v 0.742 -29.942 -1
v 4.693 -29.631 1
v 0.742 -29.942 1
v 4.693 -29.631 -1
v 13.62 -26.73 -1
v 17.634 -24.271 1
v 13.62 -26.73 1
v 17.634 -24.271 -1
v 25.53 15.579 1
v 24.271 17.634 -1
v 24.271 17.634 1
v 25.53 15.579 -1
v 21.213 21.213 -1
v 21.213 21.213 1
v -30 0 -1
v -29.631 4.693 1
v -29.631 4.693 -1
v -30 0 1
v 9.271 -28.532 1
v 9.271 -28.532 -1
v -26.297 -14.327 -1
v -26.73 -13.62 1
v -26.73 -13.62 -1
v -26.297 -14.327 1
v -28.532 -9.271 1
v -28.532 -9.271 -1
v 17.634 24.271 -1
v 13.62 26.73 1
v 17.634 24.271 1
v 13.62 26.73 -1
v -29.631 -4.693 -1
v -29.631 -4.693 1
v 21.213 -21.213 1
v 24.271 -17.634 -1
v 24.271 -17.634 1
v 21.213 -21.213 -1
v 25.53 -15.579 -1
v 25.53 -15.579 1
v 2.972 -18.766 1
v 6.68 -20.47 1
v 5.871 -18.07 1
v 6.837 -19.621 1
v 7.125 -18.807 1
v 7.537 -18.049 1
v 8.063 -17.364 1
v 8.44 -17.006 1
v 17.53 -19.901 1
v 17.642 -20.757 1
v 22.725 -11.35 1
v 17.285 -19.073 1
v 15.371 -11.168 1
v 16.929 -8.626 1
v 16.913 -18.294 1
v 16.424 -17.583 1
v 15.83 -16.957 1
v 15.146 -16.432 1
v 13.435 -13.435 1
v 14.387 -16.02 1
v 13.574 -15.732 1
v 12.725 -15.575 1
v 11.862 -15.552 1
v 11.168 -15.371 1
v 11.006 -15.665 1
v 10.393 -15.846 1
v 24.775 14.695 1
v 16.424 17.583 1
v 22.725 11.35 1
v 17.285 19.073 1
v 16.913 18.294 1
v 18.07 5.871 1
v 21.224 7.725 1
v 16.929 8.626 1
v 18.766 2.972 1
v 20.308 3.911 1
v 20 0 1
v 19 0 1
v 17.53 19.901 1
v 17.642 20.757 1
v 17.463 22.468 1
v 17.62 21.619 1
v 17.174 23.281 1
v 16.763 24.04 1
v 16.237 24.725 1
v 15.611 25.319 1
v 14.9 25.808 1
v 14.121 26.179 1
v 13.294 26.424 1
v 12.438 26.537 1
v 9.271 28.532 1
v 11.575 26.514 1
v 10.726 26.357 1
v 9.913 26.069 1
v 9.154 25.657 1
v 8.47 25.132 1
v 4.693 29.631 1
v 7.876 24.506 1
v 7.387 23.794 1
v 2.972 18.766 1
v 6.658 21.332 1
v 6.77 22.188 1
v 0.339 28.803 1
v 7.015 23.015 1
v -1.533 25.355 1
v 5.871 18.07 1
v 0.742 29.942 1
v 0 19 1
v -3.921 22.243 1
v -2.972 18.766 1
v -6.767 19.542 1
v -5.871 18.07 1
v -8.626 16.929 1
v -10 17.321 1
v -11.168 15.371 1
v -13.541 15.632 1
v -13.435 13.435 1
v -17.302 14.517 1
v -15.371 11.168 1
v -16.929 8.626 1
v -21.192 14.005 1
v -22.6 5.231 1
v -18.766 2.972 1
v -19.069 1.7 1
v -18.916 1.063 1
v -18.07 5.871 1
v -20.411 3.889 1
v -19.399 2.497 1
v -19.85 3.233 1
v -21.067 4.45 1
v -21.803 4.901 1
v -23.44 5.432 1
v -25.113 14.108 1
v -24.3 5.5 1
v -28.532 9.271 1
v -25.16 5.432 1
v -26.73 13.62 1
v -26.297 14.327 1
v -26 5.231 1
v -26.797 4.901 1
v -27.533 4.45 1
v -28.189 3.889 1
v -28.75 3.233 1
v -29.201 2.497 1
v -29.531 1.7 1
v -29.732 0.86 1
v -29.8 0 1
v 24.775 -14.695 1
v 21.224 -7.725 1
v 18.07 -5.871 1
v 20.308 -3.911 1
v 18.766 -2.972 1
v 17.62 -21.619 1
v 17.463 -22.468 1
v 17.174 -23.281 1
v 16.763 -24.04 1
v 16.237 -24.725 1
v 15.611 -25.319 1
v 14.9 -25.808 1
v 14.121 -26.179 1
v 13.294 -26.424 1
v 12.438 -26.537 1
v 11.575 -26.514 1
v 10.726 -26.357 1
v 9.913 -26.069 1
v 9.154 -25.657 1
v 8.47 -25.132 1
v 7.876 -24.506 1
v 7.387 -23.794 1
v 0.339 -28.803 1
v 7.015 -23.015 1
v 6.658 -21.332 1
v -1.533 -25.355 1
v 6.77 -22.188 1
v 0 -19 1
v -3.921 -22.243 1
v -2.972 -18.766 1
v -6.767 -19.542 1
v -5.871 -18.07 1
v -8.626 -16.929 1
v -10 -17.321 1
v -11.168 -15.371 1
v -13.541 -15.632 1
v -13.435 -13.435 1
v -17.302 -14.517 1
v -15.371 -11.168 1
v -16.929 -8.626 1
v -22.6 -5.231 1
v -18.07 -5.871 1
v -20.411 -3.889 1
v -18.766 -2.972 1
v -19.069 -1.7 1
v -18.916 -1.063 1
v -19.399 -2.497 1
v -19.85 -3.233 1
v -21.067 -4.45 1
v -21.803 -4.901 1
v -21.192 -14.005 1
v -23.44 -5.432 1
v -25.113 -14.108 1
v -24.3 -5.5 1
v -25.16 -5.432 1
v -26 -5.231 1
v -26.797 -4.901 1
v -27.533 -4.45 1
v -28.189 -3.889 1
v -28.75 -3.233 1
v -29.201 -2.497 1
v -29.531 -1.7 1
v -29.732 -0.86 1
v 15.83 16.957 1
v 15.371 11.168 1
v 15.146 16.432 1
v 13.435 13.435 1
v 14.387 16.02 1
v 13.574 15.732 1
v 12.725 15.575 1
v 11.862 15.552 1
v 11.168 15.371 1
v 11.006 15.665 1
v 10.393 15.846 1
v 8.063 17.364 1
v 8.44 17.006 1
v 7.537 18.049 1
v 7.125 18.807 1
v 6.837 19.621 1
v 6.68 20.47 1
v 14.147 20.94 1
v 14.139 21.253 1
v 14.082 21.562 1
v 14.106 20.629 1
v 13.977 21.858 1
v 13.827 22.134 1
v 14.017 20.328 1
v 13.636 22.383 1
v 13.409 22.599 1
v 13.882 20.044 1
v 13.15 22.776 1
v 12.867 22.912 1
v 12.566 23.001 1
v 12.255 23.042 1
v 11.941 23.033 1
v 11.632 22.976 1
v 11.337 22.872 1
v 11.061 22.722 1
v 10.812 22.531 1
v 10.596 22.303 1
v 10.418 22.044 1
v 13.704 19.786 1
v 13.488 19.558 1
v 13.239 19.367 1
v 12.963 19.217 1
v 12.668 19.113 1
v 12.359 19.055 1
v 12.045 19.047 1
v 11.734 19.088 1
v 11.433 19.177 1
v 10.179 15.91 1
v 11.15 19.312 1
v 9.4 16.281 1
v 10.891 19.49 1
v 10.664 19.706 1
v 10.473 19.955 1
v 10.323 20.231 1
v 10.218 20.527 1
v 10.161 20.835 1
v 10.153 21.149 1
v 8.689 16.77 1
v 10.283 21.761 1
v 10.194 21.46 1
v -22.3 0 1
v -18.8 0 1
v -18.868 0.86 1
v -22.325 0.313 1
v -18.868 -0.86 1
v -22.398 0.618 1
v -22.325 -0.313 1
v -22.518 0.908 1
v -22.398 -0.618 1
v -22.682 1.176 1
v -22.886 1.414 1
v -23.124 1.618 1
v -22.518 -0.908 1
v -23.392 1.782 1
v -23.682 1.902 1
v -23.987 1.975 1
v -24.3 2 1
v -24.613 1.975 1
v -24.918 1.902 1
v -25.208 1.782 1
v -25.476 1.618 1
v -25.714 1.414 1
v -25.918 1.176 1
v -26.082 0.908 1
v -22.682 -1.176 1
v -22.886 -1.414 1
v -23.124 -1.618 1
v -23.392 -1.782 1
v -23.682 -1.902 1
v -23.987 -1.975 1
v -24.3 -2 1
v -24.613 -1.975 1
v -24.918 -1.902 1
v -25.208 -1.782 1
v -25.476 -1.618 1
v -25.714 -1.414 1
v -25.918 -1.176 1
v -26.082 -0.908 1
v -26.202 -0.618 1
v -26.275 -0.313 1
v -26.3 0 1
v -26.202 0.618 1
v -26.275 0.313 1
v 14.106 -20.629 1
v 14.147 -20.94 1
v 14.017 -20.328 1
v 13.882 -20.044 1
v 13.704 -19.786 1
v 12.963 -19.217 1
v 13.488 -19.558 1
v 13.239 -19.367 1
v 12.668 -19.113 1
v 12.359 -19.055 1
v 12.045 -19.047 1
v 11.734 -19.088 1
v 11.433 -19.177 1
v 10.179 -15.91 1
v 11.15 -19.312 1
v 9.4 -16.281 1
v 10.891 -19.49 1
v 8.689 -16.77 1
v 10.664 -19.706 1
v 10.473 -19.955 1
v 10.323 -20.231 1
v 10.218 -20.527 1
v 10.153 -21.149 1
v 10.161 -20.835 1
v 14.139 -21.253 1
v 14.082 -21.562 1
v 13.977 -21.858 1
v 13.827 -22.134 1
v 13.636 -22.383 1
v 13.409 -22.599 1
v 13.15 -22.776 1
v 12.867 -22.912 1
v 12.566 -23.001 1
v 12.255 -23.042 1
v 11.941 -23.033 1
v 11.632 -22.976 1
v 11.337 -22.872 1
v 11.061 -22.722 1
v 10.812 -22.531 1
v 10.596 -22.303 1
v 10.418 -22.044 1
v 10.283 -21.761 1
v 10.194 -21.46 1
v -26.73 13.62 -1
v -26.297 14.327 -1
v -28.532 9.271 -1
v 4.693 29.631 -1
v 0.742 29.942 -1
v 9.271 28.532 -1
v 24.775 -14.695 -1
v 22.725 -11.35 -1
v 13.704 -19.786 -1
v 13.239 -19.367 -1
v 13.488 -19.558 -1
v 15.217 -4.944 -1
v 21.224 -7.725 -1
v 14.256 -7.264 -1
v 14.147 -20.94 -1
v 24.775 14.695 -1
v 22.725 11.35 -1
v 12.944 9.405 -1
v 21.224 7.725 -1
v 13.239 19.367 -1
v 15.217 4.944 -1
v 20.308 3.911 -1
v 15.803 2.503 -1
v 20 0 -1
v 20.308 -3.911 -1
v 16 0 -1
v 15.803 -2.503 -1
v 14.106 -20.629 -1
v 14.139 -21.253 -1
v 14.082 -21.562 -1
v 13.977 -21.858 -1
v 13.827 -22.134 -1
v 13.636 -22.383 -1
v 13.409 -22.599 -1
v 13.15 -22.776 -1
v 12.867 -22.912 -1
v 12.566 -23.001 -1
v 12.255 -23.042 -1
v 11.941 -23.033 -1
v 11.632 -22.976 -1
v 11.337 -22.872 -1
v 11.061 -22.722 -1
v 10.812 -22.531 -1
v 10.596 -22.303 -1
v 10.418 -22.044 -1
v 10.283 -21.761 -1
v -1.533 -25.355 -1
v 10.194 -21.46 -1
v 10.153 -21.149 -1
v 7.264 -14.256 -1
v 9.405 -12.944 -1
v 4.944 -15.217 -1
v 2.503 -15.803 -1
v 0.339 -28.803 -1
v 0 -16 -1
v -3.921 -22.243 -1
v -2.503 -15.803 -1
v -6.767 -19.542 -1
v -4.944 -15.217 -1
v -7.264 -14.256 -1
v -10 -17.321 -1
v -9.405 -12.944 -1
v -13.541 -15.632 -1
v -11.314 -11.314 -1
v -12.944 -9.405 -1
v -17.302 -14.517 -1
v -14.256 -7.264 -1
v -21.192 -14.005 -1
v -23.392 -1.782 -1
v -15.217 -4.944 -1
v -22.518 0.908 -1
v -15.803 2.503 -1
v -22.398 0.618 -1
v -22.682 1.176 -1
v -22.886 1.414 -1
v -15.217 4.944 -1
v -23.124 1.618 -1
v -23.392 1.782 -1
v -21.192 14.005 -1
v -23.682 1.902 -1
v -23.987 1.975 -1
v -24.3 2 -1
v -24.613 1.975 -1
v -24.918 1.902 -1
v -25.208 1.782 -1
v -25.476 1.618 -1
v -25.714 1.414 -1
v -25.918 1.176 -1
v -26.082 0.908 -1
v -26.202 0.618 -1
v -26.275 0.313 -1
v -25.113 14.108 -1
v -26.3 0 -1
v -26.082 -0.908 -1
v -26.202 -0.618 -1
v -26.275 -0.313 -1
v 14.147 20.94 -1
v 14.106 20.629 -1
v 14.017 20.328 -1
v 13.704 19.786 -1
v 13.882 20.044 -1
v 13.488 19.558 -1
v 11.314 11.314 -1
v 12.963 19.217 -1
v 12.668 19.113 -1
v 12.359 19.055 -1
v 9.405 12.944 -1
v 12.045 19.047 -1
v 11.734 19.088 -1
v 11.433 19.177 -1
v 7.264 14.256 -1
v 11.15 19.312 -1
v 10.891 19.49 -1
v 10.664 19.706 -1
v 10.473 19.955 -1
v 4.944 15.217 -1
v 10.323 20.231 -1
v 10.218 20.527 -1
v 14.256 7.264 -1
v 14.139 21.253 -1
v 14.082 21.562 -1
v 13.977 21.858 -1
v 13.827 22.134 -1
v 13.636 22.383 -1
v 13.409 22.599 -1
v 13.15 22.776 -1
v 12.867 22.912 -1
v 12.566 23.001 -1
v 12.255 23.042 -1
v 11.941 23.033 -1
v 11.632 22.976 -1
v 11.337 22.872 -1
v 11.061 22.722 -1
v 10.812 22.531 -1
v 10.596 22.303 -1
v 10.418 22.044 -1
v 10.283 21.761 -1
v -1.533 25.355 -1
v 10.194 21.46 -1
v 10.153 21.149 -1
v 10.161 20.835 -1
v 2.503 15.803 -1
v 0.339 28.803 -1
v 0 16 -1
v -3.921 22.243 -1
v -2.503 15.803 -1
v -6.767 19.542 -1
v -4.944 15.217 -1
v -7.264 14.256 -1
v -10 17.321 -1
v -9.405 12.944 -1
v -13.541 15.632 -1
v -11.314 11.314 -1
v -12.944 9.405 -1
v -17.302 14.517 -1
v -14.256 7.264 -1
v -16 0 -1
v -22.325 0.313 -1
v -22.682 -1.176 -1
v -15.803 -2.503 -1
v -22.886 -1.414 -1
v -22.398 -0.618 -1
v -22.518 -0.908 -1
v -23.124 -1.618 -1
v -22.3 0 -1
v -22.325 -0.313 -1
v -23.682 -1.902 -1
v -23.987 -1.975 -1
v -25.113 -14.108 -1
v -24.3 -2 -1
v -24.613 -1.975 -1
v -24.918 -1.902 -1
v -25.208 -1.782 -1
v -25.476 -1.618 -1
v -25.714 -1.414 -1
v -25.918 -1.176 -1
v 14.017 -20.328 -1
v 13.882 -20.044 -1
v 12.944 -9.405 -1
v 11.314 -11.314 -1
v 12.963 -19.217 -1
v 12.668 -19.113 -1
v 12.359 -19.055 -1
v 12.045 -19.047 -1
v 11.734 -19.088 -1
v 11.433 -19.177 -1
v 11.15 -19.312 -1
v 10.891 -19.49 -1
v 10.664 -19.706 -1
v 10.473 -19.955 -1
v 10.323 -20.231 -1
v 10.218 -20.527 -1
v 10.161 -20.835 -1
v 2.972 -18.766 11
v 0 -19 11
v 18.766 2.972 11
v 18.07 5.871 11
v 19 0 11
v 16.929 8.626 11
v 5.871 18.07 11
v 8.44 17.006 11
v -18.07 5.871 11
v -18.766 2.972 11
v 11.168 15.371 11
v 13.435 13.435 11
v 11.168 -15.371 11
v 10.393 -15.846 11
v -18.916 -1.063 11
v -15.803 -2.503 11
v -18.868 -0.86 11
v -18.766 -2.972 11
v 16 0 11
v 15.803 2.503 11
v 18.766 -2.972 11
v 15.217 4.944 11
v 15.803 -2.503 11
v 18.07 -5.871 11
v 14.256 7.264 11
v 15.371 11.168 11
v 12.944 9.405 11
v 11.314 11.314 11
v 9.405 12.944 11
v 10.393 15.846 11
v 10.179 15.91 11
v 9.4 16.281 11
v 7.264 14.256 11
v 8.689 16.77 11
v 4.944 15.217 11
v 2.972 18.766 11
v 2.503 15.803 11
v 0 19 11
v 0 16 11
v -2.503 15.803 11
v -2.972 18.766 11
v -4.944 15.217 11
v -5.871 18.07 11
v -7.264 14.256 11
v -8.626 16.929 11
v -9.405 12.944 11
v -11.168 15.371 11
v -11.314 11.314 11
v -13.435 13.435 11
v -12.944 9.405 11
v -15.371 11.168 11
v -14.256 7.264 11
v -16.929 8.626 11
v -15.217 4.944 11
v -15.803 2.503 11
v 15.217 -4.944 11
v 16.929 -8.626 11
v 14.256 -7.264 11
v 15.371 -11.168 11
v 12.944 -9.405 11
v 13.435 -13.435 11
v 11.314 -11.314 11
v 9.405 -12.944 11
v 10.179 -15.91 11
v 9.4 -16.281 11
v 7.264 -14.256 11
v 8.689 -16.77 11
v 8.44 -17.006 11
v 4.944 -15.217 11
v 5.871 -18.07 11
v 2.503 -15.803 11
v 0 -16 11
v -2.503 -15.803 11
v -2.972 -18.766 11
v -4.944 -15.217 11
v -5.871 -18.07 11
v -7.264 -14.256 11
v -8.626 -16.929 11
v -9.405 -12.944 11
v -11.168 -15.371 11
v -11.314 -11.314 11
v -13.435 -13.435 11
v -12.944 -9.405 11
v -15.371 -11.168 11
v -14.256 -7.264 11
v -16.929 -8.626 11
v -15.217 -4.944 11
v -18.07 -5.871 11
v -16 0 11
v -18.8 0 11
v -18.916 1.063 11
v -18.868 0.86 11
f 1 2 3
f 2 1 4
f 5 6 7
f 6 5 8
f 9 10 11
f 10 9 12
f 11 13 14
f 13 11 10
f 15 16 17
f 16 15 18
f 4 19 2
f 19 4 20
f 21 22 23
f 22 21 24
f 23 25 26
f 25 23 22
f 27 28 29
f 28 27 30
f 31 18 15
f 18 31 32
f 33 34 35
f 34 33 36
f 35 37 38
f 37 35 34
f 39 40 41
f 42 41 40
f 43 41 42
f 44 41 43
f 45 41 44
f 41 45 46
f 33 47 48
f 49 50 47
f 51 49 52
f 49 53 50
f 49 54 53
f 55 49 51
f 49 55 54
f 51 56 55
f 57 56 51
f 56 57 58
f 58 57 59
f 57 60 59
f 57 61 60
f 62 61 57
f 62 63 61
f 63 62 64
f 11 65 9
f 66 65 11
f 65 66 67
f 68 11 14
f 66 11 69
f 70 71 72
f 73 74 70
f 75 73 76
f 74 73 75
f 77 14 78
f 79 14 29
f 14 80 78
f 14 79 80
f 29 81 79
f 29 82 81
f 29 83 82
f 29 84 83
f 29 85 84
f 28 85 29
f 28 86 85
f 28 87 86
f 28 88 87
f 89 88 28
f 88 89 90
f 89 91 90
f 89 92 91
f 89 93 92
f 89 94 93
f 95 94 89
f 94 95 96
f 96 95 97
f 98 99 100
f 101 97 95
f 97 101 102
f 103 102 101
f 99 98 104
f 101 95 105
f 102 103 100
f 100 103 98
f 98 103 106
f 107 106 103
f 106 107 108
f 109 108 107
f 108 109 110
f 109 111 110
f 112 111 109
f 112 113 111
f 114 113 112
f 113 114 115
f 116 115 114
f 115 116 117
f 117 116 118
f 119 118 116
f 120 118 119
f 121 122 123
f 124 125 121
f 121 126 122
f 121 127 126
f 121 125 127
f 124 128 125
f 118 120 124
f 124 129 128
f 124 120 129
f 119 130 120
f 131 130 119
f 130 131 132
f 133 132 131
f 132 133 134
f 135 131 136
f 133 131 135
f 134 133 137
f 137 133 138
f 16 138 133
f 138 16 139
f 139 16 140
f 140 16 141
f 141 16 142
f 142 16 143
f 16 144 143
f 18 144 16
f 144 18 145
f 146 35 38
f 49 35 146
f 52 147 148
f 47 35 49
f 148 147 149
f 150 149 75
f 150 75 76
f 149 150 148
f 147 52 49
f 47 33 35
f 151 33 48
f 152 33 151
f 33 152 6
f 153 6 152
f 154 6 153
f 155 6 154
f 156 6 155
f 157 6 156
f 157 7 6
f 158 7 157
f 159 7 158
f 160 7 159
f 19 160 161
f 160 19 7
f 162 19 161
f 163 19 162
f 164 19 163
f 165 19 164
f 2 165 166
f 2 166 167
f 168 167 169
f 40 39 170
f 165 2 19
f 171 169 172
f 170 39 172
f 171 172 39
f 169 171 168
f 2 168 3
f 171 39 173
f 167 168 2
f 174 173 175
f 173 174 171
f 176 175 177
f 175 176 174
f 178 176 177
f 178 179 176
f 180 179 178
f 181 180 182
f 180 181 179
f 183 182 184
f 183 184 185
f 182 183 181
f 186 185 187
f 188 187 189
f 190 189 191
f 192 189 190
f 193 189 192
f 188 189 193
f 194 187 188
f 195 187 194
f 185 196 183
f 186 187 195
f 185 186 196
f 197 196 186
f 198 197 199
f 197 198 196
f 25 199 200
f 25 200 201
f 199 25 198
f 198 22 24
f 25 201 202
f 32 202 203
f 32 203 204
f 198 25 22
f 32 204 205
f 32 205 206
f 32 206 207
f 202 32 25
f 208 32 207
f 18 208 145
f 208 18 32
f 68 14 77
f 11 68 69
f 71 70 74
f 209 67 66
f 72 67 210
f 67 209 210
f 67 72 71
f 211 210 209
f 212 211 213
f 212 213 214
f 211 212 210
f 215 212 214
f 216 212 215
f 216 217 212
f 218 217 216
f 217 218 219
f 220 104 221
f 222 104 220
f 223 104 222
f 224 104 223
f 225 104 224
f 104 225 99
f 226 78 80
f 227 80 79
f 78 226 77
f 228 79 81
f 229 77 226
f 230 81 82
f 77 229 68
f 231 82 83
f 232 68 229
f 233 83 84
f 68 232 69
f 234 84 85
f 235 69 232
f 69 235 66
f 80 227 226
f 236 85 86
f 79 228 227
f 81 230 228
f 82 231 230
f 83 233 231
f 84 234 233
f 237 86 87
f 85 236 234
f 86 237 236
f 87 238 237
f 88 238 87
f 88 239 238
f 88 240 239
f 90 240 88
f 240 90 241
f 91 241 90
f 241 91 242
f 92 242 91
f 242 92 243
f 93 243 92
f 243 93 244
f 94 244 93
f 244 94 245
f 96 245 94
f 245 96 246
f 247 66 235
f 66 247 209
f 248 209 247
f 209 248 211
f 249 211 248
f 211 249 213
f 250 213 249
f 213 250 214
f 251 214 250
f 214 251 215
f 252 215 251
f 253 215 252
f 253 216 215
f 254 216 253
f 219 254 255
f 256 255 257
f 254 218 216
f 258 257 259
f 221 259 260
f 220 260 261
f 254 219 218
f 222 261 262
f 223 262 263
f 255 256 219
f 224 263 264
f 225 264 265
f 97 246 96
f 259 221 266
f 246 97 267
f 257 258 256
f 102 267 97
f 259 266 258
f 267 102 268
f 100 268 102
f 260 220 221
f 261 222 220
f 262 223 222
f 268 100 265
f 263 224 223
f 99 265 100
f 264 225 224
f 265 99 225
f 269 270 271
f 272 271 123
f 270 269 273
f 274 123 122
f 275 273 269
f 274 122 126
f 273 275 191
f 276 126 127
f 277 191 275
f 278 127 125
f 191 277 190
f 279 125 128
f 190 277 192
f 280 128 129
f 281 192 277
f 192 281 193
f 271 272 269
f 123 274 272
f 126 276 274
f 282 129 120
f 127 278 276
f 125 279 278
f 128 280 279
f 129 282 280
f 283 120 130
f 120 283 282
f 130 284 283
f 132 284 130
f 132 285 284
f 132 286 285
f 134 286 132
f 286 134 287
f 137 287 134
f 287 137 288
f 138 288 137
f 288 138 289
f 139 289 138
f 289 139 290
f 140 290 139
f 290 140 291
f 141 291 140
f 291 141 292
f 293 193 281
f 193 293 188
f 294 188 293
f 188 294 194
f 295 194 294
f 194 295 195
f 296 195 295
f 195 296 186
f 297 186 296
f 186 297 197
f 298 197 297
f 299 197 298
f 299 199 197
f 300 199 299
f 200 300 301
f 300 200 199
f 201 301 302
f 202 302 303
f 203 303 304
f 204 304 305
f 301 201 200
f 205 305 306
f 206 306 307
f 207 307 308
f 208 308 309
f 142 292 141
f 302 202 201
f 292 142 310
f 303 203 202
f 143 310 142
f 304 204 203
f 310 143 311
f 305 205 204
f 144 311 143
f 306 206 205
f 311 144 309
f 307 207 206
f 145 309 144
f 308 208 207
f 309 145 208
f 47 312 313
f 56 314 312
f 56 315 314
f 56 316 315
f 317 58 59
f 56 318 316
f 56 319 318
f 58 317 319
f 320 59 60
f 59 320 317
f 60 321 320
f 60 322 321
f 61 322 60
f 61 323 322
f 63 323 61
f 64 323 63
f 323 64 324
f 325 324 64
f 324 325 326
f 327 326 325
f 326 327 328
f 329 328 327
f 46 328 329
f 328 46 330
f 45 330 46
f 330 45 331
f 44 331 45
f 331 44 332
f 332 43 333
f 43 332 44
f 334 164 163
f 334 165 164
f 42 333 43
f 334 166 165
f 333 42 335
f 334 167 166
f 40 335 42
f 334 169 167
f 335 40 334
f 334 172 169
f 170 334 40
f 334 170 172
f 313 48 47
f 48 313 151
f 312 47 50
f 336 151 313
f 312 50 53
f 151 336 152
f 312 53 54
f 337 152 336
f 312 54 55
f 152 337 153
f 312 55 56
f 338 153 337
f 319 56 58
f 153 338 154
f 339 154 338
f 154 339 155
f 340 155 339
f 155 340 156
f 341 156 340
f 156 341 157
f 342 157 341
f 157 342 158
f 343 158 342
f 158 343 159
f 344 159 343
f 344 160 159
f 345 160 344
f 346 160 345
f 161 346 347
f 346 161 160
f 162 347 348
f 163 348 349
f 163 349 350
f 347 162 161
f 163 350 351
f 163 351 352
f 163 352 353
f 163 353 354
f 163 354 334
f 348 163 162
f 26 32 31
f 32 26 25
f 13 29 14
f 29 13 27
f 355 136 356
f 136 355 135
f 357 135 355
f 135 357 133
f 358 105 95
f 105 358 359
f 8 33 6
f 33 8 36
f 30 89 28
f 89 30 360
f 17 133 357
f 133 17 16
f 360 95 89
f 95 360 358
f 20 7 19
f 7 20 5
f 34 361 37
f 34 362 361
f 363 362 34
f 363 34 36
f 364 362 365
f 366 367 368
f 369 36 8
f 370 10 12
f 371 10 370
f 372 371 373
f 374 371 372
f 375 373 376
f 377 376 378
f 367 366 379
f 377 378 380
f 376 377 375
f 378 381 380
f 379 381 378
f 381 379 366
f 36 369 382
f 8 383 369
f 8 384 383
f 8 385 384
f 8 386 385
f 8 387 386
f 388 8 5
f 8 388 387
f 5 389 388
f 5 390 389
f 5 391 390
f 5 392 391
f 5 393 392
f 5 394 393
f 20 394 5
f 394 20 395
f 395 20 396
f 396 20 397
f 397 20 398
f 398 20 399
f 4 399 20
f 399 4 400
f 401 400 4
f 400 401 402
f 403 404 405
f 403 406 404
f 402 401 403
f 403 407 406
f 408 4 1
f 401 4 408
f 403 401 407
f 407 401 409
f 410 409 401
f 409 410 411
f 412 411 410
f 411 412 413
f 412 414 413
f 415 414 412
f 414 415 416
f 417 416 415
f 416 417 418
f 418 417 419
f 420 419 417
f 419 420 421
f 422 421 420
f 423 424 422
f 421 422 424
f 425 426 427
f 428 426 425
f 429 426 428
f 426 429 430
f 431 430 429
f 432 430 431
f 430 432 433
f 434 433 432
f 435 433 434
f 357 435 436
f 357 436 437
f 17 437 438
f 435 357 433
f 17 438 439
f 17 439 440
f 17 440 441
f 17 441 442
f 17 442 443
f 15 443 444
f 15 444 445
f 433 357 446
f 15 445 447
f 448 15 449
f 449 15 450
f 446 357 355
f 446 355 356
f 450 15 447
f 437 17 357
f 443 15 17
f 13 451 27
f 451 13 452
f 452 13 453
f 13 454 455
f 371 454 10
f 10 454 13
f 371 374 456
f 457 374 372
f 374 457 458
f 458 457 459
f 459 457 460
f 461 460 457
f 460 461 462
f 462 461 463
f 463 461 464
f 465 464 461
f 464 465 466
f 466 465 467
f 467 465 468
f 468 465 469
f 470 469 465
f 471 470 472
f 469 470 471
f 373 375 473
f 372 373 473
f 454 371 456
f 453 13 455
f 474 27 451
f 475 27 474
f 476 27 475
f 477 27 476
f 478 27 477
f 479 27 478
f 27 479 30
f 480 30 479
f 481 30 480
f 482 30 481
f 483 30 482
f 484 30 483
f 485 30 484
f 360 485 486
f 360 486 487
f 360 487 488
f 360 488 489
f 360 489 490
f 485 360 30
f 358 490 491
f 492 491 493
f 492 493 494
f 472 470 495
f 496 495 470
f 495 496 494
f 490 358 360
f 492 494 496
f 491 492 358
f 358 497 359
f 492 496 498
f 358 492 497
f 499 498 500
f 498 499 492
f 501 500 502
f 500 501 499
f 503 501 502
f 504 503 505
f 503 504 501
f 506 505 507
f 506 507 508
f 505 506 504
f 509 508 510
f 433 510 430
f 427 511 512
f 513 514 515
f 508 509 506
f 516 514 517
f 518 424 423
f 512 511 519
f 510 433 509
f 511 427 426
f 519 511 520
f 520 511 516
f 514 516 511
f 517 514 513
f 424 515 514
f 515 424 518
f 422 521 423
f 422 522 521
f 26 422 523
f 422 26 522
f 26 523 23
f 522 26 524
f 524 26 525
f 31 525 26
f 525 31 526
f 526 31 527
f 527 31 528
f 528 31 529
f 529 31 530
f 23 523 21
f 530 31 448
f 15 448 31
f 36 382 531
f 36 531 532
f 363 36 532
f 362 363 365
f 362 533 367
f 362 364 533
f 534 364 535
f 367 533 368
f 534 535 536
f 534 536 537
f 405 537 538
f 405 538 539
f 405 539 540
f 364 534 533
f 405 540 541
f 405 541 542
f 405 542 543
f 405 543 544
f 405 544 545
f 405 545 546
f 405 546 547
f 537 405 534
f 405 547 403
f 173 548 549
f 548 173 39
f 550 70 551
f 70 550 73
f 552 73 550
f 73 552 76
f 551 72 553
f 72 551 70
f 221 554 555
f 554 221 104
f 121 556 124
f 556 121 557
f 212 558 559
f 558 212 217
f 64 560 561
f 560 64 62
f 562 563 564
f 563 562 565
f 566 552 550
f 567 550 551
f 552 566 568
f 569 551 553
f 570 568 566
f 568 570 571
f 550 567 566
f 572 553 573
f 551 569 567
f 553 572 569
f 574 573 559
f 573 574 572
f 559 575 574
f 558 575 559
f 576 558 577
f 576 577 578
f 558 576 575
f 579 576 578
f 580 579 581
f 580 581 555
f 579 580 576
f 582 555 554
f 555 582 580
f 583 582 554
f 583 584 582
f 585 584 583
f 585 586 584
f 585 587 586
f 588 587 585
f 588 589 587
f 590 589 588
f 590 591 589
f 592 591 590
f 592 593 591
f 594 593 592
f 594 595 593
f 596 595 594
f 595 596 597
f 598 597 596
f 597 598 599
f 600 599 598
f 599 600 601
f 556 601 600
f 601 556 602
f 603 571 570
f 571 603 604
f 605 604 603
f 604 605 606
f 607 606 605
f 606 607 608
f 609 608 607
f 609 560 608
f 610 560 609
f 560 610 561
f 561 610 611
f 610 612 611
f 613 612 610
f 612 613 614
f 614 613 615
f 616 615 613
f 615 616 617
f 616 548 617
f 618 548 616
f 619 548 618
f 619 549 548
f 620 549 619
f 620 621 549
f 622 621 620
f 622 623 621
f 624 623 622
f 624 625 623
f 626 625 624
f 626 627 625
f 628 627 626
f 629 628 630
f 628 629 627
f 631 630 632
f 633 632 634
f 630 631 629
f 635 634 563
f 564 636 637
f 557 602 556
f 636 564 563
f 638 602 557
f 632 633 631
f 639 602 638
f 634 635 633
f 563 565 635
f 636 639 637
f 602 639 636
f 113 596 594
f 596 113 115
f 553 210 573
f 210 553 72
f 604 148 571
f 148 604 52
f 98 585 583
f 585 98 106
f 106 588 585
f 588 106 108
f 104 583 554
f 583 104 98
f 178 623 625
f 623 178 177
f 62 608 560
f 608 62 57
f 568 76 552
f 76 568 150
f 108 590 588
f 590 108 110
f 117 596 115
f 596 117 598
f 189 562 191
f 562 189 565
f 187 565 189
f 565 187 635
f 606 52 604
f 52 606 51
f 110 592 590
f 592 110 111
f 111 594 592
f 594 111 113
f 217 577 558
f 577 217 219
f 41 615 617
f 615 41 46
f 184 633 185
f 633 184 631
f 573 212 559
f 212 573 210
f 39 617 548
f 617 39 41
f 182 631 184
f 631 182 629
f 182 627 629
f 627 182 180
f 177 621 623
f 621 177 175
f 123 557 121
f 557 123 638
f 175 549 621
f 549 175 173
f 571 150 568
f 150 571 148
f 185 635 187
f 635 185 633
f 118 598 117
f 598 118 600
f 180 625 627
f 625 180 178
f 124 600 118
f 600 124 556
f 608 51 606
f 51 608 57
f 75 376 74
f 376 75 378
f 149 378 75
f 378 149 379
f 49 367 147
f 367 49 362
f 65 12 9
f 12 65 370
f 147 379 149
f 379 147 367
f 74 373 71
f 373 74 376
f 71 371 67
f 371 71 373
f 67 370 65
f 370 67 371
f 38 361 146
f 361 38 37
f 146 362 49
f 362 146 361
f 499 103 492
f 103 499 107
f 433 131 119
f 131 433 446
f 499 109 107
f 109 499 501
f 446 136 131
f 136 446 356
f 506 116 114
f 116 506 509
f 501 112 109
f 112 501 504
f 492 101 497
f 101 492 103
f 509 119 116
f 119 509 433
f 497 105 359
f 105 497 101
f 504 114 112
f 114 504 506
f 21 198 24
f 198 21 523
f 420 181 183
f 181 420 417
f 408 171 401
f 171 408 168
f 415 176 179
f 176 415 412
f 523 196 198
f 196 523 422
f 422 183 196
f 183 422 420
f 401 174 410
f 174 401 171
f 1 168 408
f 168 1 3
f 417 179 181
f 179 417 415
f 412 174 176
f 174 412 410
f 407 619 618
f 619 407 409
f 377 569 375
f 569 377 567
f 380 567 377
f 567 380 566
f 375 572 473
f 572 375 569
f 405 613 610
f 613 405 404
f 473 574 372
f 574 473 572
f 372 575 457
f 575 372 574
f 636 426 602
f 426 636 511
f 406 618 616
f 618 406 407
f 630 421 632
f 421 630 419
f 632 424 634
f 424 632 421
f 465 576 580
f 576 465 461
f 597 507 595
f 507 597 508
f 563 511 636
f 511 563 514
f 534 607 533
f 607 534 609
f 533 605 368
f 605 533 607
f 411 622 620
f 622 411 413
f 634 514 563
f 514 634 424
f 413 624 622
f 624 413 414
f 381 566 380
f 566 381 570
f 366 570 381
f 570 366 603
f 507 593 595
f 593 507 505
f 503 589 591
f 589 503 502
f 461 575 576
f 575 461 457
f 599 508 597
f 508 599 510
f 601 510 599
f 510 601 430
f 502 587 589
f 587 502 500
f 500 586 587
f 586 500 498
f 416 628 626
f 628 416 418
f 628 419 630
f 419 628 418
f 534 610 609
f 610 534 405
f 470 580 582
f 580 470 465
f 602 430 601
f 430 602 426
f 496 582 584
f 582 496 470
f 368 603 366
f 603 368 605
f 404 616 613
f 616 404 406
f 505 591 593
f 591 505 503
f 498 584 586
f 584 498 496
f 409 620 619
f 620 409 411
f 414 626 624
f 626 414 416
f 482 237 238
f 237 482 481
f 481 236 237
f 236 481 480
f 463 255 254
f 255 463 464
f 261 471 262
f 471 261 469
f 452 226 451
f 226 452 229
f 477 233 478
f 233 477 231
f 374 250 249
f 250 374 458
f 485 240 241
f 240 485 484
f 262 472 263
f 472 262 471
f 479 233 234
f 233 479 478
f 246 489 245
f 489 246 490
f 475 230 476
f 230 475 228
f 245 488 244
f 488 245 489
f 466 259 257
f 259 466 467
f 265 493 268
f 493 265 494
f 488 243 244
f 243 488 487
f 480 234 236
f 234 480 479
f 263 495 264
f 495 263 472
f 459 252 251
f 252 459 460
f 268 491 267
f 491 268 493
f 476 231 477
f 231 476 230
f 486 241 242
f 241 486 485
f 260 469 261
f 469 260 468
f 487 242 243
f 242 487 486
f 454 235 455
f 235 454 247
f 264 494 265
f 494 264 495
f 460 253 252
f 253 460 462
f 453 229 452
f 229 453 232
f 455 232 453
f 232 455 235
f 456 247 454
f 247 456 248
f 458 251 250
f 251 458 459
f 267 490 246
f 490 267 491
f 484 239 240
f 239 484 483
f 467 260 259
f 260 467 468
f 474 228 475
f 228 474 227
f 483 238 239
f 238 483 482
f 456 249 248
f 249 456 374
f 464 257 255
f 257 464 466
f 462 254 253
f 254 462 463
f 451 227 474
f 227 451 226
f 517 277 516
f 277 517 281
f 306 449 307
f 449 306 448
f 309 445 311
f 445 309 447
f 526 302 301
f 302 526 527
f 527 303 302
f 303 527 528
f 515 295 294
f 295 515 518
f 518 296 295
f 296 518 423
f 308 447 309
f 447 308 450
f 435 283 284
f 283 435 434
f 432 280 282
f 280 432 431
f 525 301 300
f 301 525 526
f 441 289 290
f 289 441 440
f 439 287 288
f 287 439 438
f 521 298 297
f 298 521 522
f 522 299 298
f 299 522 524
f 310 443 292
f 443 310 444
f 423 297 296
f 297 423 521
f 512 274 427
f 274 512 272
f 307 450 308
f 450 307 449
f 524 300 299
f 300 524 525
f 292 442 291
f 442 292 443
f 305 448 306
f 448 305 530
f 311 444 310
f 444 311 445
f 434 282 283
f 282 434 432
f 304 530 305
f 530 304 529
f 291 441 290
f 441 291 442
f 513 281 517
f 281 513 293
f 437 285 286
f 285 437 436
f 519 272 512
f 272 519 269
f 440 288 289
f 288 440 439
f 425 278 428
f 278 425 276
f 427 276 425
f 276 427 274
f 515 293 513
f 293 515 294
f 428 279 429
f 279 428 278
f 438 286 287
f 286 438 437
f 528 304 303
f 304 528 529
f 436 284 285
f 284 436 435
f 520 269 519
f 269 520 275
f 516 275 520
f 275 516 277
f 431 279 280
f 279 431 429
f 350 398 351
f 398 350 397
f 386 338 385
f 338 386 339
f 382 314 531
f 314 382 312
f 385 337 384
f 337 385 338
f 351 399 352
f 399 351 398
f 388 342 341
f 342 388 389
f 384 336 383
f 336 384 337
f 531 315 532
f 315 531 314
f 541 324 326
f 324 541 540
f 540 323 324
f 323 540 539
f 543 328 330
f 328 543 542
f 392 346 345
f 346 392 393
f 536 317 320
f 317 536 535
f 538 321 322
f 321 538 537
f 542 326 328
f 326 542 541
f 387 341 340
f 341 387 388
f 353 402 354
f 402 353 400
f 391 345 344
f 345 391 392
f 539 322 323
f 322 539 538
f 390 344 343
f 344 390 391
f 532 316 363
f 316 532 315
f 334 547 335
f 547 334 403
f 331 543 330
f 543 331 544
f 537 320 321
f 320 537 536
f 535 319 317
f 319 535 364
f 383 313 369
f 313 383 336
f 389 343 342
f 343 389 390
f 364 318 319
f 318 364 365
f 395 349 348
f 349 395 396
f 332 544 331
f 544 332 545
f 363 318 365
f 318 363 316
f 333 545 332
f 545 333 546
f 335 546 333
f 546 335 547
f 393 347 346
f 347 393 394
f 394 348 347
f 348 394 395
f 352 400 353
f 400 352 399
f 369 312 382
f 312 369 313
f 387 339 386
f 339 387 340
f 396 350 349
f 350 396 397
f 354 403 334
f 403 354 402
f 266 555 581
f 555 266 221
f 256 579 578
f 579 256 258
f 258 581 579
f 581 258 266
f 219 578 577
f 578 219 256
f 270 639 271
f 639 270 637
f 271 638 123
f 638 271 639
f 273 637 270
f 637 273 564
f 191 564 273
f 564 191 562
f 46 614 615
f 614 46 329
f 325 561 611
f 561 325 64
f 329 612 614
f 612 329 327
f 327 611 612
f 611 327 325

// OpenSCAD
// Units are in mm.

// The overall size of the hub flange.
flange_diameter = 60;
// The size of the PVC pipe going through the hub.  This is tHe perfect size for 3/4" PVC.  It will bend a little and your bushings may be a little loose so there is no need to add tolerance here unless your PVC is actually a different size.  Measure it.  It will fail if you don't have it just right.
pvc_diameter = 26.6;    
// The size of the hole in the center of the hub.  It must be larger than the rod going through it.
center_hole_diameter = 32;    
// The size of the bushing.  This should be the EXACT size of the hole in your spool. The default should fit spools from MonoPrice.com
bushing_diameter = 38;
// The size of your bearing.  This is the correct value for a 608 skate bearing.
bearing_diameter = 22;
// The inner diameter of your bearing.  This is the correct value for a #6 screw which is what I use.  For a 608 bearing, 8 is the maximum.
bearing_screw_diameter = 4;
// The diameter of the head or washer of your bearing screw. Give yourself a little extra room.
bearing_screw_head_diameter = 11;
// Indicates whether to apply cutouts to save material when printing.  
use_cutouts = 1; // [0:No,1:Yes]
// The thickness of the flange.
thickness = 2;
// The length of the bushing; how far it extends into the spool.
bushing_height = 12;
//bushing_height = 1;
//bushing_height = thickness * 3;
// If the cutouts cut too far into the center, use this to move the cutouts.
cutout_position_offset = 15;
// If the cutouts are too small, use this to enlarge them.  Adjusting the cutouts allows you to minimize printing material.
cutout_size_offset = 10;

// Higher resolution rendering for cleaner holes.  40 is good.
$fn = 40;


bushing_thickness = bushing_diameter - pvc_diameter;
// Something wrong with OpenSCAD.NET.  Assigning a variable to itself or roundtrip will give it a strange value and breaks things.
//c = (bushing_height == 1) ? thickness * 3 : bushing_height;
//c = bushing_height ;
//bushing_height = c;

function bearing_screw_offset() = pvc_diameter/2 + bearing_diameter/2;
function bearing_screw_head_clearance_hole_height() = bushing_height;
function bearing_screw_head_clearance_hole_zoffset() = bearing_screw_head_clearance_hole_height() + thickness / 2;


difference () {
    union() {
        // Plate
        cylinder(r = flange_diameter/2, h = thickness, center = true);
        // Spool bushing
//        translate ([0, 0, (bushing_height - thickness) / 2]) cylinder(r = pvc_diameter/2 + bushing_thickness, h = bushing_height, center = true);
        translate ([0, 0, (bushing_height - thickness) / 2]) cylinder(r = (pvc_diameter + bushing_thickness) / 2, h = bushing_height, center = true);
    }      
    // Hub inner hole
    //cylinder(r = pvc_diameter/2, h = bushing_height * 10, center = true);
    cylinder(r = center_hole_diameter/2, h = bushing_height * 10, center = true);

    // Larger cutouts, for saving material (optional).
    if (use_cutouts) {
        rotate ([0, 0, 0]) translate ([flange_diameter/2 + cutout_position_offset, 0, 0]) cylinder(r = flange_diameter/4 + cutout_size_offset, h = thickness * 100 + 2, center = true);
        rotate ([0, 0, 120]) translate ([flange_diameter/2 + cutout_position_offset, 0, 0]) cylinder(r = flange_diameter/4 + cutout_size_offset, h = thickness * 100 + 2, center = true);
        rotate ([0, 0, 240]) translate ([flange_diameter/2 + cutout_position_offset, 0, 0]) cylinder(r = flange_diameter/4 + cutout_size_offset, h = thickness * 100 + 2, center = true);
    }
    // Smaller holes, for bearing screws.
    rotate([0, 0, 60+0]) translate ([pvc_diameter/2 + bearing_diameter/2, 0, 0]) cylinder(r = bearing_screw_diameter/2, h = thickness + 2, center = true);
    rotate([0, 0, 60+120]) translate ([pvc_diameter/2 + bearing_diameter/2, 0, 0]) cylinder(r = bearing_screw_diameter/2, h = thickness + 2, center = true);
    rotate([0, 0, 60+240]) translate ([pvc_diameter/2 + bearing_diameter/2, 0, 0]) cylinder(r = bearing_screw_diameter/2, h = thickness + 2, center = true);


    // Holes for clearing bearing screw heads.
//    rotate([0, 0, 60+0]) translate ([pvc_diameter/2 + bearing_diameter/2, 0, (thickness + 2) * 10 / 2 + thickness / 2]) cylinder(r = bearing_screw_head_diameter/2, h = (thickness + 2) * 10, center = true);
//    rotate([0, 0, 60+120]) translate ([pvc_diameter/2 + bearing_diameter/2, 0, thickness * 2]) cylinder(r = bearing_screw_head_diameter/2, h = (thickness + 2) * 10, center = true);
//    rotate([0, 0, 60+240]) translate ([pvc_diameter/2 + bearing_diameter/2, 0, thickness * 4]) cylinder(r = bearing_screw_head_diameter/2, h = (thickness + 2) * 10, center = true);

    rotate([0, 0, 60+0]) translate ([bearing_screw_offset(), 0,bearing_screw_head_clearance_hole_zoffset()]) cylinder(r = bearing_screw_head_diameter/2, h = bearing_screw_head_clearance_hole_height() * 2, center = true);
    rotate([0, 0, 60+120]) translate ([bearing_screw_offset(), 0, bearing_screw_head_clearance_hole_zoffset()]) cylinder(r = bearing_screw_head_diameter/2, h = bearing_screw_head_clearance_hole_height() * 2, center = true);
    rotate([0, 0, 60+240]) translate ([bearing_screw_offset(), 0, bearing_screw_head_clearance_hole_zoffset()]) cylinder(r = bearing_screw_head_diameter/2, h = bearing_screw_head_clearance_hole_height() * 2, center = true);

}
